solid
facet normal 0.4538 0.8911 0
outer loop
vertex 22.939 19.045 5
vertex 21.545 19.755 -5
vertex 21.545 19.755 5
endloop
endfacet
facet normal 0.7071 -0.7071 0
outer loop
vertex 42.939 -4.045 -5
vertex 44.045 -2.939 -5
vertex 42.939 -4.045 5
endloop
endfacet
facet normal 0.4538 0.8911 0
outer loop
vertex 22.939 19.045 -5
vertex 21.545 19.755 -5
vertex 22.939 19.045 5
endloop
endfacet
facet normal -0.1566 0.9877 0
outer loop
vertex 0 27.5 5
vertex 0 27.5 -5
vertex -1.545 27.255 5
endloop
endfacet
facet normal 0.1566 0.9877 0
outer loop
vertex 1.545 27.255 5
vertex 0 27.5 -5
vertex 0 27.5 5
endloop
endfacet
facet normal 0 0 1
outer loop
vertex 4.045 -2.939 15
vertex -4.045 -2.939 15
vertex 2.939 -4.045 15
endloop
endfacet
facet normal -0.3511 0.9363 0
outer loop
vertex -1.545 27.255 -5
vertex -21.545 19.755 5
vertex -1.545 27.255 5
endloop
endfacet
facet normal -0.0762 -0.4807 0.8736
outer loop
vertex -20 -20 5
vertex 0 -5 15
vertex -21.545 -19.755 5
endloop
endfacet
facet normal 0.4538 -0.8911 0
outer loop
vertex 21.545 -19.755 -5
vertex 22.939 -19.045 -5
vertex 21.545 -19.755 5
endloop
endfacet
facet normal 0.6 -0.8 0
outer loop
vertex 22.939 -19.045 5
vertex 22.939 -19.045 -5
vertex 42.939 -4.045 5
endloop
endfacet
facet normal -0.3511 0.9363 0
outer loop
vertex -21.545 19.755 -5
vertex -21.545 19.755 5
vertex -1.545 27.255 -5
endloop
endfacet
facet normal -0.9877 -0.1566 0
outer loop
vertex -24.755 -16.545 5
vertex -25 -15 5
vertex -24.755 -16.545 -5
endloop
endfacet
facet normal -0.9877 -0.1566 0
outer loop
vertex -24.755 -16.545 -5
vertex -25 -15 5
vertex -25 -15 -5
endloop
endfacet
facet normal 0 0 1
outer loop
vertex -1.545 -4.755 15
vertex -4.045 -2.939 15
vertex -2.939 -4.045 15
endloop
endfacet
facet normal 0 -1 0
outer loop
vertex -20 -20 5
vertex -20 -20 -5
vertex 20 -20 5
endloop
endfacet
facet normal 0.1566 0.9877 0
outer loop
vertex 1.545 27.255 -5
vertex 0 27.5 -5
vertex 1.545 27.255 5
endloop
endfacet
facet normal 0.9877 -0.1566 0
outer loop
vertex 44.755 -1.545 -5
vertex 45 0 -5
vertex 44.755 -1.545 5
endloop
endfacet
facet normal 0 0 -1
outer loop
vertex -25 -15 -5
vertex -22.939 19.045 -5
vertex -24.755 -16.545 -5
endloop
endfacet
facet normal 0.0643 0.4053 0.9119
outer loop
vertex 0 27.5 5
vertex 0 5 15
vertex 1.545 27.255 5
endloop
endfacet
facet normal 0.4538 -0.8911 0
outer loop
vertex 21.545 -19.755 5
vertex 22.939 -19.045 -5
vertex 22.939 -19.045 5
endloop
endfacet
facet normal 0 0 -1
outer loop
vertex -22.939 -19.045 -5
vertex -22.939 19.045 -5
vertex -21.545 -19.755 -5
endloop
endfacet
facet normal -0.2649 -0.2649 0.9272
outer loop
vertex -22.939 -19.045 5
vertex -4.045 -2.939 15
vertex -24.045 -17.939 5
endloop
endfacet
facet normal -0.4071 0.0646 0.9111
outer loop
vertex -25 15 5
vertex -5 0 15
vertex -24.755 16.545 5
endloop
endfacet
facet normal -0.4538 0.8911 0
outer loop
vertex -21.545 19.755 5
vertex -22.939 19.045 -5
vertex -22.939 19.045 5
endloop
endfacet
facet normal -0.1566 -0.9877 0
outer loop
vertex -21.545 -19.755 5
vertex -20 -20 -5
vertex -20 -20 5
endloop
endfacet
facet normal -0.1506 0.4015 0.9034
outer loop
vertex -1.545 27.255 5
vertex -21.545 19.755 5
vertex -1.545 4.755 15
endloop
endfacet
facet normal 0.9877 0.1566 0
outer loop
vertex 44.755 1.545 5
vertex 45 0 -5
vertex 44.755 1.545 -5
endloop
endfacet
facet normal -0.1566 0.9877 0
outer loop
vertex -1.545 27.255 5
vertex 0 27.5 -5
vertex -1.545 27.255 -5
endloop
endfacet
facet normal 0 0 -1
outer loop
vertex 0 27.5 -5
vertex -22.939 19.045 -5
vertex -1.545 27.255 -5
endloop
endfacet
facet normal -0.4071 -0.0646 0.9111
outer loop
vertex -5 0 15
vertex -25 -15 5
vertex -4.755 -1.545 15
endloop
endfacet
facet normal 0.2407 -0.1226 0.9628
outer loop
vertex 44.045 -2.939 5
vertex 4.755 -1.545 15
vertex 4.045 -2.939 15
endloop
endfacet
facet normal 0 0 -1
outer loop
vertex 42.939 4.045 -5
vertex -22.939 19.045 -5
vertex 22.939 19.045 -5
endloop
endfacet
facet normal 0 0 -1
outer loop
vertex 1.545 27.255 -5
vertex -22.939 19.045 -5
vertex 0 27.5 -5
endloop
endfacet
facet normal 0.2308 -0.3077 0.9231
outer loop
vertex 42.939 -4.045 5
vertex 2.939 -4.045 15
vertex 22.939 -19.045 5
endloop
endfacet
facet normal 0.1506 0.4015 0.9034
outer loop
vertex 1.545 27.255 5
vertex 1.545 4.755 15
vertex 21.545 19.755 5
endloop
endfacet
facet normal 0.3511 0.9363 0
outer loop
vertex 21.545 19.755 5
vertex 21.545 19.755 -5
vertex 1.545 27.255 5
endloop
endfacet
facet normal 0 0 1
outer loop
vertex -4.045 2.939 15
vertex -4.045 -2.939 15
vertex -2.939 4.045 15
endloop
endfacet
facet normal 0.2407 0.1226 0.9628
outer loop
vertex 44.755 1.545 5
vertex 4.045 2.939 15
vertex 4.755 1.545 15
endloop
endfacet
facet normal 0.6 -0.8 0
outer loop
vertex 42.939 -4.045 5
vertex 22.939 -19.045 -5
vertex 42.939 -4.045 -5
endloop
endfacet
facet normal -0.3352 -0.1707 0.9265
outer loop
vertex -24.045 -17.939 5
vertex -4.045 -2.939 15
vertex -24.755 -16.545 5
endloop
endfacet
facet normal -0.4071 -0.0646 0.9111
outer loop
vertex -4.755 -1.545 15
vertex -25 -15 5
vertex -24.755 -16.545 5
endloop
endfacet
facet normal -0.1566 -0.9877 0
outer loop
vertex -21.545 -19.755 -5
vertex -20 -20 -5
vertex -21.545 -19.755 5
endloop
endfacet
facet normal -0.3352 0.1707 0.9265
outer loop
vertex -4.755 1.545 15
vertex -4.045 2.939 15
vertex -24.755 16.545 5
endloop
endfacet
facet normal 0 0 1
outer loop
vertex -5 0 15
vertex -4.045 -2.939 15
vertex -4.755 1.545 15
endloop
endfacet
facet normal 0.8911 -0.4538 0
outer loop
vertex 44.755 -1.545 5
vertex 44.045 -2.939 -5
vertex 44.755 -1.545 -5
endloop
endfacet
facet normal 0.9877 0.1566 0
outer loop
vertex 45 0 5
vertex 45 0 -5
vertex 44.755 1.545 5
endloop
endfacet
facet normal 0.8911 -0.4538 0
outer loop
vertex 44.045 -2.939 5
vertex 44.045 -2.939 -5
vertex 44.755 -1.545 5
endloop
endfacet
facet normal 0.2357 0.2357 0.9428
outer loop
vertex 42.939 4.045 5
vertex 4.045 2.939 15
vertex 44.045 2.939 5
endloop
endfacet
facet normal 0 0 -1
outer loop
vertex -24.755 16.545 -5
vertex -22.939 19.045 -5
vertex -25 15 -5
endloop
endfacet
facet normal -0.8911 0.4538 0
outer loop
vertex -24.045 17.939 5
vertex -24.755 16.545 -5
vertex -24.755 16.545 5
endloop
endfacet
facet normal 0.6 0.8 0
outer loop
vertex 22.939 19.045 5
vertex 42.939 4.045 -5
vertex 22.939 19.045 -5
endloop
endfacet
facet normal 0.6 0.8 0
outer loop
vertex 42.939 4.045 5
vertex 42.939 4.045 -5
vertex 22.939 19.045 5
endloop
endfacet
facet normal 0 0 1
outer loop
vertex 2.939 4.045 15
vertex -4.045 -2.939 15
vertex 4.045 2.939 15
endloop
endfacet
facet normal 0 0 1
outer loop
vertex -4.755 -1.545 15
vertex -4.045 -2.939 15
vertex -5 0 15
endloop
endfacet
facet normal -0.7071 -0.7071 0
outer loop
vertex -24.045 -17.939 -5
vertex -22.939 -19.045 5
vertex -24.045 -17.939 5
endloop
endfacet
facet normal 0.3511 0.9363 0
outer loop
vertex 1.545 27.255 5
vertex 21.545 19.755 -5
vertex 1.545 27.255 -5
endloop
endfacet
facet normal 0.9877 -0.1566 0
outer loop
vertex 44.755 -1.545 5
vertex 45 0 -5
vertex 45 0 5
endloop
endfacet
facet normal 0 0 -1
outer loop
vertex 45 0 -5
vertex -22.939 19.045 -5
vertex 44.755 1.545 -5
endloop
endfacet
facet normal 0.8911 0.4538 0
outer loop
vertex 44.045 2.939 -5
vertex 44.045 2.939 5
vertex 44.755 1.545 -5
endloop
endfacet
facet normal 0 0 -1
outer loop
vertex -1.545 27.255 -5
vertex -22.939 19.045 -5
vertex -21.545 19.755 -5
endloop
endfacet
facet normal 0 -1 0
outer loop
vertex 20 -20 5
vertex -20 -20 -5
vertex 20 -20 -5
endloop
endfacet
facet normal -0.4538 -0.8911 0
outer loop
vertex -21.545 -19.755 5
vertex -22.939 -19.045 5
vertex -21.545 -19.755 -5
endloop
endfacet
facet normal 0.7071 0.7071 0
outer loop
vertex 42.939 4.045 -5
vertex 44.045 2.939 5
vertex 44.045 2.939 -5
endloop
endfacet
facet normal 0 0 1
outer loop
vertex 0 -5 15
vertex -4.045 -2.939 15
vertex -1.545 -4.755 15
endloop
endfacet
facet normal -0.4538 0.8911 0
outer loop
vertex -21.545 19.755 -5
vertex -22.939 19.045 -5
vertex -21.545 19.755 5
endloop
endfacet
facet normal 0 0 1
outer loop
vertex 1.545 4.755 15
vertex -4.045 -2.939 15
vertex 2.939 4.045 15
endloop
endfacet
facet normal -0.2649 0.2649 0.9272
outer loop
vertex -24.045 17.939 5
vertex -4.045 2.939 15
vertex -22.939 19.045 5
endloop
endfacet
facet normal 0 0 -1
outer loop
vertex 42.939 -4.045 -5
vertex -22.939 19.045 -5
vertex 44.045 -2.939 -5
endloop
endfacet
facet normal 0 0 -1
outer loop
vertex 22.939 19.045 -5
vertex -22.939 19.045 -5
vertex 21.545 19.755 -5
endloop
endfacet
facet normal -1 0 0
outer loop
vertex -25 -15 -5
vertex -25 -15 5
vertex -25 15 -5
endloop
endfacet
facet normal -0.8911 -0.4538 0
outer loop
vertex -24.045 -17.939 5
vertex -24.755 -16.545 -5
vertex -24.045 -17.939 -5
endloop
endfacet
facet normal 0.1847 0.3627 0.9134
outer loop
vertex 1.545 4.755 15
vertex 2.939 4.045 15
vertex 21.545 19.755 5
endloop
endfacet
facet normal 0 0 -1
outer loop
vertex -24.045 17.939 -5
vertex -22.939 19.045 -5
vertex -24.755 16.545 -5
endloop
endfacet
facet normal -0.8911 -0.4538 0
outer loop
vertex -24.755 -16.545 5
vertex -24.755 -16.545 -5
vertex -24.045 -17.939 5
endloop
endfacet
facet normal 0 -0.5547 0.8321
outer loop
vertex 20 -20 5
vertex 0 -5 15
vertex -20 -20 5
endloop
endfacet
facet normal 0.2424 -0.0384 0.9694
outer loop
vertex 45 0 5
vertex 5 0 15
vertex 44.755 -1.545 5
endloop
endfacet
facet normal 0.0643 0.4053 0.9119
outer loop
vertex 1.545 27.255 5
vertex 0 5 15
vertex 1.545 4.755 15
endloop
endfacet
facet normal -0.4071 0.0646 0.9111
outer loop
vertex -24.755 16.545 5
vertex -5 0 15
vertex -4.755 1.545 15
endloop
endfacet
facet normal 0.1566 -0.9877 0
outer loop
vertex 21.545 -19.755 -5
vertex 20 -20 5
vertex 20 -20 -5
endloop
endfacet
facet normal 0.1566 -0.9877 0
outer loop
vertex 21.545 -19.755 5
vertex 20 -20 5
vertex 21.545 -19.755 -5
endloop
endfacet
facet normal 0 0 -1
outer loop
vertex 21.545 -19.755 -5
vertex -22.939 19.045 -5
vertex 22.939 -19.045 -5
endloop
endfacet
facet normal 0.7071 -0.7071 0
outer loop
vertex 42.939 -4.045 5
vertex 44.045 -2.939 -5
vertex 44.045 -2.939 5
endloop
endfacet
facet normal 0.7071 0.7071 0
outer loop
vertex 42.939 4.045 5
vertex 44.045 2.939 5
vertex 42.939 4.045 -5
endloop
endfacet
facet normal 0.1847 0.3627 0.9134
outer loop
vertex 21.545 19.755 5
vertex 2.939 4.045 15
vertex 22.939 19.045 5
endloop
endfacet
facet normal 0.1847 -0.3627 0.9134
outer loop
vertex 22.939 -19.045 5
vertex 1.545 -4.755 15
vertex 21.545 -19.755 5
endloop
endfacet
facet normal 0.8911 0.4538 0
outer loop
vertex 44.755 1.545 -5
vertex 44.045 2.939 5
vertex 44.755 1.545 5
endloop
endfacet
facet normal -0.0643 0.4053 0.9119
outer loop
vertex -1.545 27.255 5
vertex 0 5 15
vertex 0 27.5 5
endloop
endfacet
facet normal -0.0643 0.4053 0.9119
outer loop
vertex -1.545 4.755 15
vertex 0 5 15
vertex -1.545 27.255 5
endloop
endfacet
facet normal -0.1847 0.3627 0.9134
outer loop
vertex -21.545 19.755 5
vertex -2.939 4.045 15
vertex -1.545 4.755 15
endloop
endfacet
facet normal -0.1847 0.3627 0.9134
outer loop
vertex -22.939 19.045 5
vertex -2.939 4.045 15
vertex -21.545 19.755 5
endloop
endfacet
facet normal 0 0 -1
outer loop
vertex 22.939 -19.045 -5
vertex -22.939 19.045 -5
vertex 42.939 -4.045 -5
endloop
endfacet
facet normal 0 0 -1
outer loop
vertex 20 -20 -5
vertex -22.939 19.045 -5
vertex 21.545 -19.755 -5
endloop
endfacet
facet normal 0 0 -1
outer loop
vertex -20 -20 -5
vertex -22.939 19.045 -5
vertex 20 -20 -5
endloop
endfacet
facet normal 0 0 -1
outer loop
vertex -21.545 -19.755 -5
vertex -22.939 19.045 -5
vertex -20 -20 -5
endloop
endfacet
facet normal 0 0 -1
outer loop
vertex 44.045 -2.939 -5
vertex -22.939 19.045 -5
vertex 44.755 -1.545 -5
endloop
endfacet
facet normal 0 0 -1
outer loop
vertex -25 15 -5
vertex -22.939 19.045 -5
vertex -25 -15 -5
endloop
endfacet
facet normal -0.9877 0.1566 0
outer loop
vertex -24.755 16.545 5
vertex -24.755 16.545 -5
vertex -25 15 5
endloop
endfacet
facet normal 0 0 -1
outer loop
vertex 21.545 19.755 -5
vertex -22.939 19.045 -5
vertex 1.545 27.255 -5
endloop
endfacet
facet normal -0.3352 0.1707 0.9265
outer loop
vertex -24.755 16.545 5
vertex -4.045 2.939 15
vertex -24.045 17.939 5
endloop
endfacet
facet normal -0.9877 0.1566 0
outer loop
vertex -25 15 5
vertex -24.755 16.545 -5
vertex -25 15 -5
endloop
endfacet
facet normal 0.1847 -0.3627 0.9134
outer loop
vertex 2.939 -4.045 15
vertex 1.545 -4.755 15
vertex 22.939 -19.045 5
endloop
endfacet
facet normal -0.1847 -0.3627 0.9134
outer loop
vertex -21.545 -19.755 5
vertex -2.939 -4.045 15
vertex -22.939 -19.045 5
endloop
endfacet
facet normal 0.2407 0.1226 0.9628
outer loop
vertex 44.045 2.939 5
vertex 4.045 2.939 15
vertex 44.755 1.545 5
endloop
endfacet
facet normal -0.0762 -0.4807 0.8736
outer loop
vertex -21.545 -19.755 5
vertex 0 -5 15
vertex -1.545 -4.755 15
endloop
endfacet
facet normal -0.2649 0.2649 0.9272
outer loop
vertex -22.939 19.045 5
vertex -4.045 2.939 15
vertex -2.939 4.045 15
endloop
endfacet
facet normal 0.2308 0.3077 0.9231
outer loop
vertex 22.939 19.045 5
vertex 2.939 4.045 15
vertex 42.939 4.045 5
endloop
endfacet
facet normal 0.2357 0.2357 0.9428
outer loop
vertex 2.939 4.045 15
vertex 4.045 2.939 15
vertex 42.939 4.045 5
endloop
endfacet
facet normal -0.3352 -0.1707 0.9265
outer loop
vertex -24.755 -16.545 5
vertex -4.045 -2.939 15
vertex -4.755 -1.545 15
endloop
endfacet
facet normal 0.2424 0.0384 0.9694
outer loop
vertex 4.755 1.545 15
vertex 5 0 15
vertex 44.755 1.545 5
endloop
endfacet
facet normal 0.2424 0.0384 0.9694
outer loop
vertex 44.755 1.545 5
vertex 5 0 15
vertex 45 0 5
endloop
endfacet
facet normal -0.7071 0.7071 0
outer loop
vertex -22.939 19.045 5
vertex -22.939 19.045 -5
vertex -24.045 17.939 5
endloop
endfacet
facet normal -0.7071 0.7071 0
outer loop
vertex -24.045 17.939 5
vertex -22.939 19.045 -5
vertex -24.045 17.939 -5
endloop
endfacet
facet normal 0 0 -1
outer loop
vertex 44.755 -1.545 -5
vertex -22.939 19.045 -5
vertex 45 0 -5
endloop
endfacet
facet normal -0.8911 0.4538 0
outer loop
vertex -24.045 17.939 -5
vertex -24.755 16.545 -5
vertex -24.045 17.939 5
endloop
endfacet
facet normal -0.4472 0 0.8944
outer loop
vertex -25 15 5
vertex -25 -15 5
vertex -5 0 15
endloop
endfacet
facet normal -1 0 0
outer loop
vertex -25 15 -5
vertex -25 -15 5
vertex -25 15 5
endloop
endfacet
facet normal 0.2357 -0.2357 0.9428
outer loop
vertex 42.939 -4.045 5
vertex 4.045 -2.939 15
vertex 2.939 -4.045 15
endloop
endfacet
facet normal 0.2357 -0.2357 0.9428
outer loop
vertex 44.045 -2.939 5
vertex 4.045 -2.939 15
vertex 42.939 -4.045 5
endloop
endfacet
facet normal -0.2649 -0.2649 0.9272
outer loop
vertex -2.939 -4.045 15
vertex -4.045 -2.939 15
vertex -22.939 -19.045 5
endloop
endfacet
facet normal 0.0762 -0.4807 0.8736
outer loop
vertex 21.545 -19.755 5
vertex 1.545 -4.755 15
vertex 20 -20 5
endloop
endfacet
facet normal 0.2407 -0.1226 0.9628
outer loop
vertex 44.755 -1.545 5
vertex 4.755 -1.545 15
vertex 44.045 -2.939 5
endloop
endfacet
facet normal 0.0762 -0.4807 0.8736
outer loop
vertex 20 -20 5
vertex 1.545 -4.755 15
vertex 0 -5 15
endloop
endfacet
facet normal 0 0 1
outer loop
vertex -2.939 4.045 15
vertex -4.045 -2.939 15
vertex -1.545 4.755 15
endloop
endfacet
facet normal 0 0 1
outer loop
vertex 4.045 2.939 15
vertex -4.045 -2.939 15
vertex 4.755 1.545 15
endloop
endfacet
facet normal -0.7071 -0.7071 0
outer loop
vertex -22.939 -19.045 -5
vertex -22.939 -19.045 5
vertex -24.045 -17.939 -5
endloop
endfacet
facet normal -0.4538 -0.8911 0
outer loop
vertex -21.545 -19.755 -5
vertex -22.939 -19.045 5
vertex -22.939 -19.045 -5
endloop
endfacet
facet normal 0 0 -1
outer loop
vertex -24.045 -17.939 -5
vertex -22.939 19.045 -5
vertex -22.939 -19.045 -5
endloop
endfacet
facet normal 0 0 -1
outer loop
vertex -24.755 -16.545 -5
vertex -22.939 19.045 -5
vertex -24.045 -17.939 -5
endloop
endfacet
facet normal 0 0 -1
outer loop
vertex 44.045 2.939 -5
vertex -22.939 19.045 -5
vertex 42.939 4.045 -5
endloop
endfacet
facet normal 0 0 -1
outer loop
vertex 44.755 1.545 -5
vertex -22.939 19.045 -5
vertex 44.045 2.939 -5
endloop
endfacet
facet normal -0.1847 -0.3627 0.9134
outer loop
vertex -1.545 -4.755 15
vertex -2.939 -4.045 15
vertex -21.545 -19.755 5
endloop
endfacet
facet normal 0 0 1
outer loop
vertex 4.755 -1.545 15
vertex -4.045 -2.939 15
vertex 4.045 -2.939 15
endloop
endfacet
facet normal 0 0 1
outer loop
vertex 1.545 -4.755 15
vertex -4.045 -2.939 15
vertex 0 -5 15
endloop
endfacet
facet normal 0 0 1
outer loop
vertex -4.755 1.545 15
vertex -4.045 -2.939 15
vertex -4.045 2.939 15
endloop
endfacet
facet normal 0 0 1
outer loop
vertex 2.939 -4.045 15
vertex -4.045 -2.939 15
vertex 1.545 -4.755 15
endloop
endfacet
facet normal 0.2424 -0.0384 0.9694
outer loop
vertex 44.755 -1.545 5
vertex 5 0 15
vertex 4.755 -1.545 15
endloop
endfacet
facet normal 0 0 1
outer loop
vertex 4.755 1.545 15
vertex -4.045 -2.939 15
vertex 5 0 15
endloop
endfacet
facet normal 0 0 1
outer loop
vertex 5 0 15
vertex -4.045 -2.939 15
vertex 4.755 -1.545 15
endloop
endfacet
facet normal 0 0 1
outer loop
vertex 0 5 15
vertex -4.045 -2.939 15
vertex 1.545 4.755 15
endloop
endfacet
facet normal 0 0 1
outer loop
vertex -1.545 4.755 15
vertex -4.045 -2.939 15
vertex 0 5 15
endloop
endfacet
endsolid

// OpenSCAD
//-- Parámetros
r=5;    //-- Radio redondeo esquinas
h=10;   //-- Altura

//-- Coordenadas cilindro primer cuadrante
cx=20;
cy=15;

//-- Vector de puntos con posiciones cilindros
POINT=[
    [cx,cy,0],      //-- 0
    [-cx,cy,0],     //-- 1
    [-cx,-cy,0],    //-- 2
    [cx,-cy,0],     //-- 3
    [2*cx,0,0],     //-- 4
    [0,1.5*cy,0],   //-- 5
    [0,0,h],        //-- 6
];

//-- Menor objeto convexo que contine los puntos en POINT
hull(){
    //-- Dibujar cada cilindro en su posición
    for(pos=POINT)
        translate(pos)
            cylinder(r=r,h=h,center=true,$fn=20);
}
